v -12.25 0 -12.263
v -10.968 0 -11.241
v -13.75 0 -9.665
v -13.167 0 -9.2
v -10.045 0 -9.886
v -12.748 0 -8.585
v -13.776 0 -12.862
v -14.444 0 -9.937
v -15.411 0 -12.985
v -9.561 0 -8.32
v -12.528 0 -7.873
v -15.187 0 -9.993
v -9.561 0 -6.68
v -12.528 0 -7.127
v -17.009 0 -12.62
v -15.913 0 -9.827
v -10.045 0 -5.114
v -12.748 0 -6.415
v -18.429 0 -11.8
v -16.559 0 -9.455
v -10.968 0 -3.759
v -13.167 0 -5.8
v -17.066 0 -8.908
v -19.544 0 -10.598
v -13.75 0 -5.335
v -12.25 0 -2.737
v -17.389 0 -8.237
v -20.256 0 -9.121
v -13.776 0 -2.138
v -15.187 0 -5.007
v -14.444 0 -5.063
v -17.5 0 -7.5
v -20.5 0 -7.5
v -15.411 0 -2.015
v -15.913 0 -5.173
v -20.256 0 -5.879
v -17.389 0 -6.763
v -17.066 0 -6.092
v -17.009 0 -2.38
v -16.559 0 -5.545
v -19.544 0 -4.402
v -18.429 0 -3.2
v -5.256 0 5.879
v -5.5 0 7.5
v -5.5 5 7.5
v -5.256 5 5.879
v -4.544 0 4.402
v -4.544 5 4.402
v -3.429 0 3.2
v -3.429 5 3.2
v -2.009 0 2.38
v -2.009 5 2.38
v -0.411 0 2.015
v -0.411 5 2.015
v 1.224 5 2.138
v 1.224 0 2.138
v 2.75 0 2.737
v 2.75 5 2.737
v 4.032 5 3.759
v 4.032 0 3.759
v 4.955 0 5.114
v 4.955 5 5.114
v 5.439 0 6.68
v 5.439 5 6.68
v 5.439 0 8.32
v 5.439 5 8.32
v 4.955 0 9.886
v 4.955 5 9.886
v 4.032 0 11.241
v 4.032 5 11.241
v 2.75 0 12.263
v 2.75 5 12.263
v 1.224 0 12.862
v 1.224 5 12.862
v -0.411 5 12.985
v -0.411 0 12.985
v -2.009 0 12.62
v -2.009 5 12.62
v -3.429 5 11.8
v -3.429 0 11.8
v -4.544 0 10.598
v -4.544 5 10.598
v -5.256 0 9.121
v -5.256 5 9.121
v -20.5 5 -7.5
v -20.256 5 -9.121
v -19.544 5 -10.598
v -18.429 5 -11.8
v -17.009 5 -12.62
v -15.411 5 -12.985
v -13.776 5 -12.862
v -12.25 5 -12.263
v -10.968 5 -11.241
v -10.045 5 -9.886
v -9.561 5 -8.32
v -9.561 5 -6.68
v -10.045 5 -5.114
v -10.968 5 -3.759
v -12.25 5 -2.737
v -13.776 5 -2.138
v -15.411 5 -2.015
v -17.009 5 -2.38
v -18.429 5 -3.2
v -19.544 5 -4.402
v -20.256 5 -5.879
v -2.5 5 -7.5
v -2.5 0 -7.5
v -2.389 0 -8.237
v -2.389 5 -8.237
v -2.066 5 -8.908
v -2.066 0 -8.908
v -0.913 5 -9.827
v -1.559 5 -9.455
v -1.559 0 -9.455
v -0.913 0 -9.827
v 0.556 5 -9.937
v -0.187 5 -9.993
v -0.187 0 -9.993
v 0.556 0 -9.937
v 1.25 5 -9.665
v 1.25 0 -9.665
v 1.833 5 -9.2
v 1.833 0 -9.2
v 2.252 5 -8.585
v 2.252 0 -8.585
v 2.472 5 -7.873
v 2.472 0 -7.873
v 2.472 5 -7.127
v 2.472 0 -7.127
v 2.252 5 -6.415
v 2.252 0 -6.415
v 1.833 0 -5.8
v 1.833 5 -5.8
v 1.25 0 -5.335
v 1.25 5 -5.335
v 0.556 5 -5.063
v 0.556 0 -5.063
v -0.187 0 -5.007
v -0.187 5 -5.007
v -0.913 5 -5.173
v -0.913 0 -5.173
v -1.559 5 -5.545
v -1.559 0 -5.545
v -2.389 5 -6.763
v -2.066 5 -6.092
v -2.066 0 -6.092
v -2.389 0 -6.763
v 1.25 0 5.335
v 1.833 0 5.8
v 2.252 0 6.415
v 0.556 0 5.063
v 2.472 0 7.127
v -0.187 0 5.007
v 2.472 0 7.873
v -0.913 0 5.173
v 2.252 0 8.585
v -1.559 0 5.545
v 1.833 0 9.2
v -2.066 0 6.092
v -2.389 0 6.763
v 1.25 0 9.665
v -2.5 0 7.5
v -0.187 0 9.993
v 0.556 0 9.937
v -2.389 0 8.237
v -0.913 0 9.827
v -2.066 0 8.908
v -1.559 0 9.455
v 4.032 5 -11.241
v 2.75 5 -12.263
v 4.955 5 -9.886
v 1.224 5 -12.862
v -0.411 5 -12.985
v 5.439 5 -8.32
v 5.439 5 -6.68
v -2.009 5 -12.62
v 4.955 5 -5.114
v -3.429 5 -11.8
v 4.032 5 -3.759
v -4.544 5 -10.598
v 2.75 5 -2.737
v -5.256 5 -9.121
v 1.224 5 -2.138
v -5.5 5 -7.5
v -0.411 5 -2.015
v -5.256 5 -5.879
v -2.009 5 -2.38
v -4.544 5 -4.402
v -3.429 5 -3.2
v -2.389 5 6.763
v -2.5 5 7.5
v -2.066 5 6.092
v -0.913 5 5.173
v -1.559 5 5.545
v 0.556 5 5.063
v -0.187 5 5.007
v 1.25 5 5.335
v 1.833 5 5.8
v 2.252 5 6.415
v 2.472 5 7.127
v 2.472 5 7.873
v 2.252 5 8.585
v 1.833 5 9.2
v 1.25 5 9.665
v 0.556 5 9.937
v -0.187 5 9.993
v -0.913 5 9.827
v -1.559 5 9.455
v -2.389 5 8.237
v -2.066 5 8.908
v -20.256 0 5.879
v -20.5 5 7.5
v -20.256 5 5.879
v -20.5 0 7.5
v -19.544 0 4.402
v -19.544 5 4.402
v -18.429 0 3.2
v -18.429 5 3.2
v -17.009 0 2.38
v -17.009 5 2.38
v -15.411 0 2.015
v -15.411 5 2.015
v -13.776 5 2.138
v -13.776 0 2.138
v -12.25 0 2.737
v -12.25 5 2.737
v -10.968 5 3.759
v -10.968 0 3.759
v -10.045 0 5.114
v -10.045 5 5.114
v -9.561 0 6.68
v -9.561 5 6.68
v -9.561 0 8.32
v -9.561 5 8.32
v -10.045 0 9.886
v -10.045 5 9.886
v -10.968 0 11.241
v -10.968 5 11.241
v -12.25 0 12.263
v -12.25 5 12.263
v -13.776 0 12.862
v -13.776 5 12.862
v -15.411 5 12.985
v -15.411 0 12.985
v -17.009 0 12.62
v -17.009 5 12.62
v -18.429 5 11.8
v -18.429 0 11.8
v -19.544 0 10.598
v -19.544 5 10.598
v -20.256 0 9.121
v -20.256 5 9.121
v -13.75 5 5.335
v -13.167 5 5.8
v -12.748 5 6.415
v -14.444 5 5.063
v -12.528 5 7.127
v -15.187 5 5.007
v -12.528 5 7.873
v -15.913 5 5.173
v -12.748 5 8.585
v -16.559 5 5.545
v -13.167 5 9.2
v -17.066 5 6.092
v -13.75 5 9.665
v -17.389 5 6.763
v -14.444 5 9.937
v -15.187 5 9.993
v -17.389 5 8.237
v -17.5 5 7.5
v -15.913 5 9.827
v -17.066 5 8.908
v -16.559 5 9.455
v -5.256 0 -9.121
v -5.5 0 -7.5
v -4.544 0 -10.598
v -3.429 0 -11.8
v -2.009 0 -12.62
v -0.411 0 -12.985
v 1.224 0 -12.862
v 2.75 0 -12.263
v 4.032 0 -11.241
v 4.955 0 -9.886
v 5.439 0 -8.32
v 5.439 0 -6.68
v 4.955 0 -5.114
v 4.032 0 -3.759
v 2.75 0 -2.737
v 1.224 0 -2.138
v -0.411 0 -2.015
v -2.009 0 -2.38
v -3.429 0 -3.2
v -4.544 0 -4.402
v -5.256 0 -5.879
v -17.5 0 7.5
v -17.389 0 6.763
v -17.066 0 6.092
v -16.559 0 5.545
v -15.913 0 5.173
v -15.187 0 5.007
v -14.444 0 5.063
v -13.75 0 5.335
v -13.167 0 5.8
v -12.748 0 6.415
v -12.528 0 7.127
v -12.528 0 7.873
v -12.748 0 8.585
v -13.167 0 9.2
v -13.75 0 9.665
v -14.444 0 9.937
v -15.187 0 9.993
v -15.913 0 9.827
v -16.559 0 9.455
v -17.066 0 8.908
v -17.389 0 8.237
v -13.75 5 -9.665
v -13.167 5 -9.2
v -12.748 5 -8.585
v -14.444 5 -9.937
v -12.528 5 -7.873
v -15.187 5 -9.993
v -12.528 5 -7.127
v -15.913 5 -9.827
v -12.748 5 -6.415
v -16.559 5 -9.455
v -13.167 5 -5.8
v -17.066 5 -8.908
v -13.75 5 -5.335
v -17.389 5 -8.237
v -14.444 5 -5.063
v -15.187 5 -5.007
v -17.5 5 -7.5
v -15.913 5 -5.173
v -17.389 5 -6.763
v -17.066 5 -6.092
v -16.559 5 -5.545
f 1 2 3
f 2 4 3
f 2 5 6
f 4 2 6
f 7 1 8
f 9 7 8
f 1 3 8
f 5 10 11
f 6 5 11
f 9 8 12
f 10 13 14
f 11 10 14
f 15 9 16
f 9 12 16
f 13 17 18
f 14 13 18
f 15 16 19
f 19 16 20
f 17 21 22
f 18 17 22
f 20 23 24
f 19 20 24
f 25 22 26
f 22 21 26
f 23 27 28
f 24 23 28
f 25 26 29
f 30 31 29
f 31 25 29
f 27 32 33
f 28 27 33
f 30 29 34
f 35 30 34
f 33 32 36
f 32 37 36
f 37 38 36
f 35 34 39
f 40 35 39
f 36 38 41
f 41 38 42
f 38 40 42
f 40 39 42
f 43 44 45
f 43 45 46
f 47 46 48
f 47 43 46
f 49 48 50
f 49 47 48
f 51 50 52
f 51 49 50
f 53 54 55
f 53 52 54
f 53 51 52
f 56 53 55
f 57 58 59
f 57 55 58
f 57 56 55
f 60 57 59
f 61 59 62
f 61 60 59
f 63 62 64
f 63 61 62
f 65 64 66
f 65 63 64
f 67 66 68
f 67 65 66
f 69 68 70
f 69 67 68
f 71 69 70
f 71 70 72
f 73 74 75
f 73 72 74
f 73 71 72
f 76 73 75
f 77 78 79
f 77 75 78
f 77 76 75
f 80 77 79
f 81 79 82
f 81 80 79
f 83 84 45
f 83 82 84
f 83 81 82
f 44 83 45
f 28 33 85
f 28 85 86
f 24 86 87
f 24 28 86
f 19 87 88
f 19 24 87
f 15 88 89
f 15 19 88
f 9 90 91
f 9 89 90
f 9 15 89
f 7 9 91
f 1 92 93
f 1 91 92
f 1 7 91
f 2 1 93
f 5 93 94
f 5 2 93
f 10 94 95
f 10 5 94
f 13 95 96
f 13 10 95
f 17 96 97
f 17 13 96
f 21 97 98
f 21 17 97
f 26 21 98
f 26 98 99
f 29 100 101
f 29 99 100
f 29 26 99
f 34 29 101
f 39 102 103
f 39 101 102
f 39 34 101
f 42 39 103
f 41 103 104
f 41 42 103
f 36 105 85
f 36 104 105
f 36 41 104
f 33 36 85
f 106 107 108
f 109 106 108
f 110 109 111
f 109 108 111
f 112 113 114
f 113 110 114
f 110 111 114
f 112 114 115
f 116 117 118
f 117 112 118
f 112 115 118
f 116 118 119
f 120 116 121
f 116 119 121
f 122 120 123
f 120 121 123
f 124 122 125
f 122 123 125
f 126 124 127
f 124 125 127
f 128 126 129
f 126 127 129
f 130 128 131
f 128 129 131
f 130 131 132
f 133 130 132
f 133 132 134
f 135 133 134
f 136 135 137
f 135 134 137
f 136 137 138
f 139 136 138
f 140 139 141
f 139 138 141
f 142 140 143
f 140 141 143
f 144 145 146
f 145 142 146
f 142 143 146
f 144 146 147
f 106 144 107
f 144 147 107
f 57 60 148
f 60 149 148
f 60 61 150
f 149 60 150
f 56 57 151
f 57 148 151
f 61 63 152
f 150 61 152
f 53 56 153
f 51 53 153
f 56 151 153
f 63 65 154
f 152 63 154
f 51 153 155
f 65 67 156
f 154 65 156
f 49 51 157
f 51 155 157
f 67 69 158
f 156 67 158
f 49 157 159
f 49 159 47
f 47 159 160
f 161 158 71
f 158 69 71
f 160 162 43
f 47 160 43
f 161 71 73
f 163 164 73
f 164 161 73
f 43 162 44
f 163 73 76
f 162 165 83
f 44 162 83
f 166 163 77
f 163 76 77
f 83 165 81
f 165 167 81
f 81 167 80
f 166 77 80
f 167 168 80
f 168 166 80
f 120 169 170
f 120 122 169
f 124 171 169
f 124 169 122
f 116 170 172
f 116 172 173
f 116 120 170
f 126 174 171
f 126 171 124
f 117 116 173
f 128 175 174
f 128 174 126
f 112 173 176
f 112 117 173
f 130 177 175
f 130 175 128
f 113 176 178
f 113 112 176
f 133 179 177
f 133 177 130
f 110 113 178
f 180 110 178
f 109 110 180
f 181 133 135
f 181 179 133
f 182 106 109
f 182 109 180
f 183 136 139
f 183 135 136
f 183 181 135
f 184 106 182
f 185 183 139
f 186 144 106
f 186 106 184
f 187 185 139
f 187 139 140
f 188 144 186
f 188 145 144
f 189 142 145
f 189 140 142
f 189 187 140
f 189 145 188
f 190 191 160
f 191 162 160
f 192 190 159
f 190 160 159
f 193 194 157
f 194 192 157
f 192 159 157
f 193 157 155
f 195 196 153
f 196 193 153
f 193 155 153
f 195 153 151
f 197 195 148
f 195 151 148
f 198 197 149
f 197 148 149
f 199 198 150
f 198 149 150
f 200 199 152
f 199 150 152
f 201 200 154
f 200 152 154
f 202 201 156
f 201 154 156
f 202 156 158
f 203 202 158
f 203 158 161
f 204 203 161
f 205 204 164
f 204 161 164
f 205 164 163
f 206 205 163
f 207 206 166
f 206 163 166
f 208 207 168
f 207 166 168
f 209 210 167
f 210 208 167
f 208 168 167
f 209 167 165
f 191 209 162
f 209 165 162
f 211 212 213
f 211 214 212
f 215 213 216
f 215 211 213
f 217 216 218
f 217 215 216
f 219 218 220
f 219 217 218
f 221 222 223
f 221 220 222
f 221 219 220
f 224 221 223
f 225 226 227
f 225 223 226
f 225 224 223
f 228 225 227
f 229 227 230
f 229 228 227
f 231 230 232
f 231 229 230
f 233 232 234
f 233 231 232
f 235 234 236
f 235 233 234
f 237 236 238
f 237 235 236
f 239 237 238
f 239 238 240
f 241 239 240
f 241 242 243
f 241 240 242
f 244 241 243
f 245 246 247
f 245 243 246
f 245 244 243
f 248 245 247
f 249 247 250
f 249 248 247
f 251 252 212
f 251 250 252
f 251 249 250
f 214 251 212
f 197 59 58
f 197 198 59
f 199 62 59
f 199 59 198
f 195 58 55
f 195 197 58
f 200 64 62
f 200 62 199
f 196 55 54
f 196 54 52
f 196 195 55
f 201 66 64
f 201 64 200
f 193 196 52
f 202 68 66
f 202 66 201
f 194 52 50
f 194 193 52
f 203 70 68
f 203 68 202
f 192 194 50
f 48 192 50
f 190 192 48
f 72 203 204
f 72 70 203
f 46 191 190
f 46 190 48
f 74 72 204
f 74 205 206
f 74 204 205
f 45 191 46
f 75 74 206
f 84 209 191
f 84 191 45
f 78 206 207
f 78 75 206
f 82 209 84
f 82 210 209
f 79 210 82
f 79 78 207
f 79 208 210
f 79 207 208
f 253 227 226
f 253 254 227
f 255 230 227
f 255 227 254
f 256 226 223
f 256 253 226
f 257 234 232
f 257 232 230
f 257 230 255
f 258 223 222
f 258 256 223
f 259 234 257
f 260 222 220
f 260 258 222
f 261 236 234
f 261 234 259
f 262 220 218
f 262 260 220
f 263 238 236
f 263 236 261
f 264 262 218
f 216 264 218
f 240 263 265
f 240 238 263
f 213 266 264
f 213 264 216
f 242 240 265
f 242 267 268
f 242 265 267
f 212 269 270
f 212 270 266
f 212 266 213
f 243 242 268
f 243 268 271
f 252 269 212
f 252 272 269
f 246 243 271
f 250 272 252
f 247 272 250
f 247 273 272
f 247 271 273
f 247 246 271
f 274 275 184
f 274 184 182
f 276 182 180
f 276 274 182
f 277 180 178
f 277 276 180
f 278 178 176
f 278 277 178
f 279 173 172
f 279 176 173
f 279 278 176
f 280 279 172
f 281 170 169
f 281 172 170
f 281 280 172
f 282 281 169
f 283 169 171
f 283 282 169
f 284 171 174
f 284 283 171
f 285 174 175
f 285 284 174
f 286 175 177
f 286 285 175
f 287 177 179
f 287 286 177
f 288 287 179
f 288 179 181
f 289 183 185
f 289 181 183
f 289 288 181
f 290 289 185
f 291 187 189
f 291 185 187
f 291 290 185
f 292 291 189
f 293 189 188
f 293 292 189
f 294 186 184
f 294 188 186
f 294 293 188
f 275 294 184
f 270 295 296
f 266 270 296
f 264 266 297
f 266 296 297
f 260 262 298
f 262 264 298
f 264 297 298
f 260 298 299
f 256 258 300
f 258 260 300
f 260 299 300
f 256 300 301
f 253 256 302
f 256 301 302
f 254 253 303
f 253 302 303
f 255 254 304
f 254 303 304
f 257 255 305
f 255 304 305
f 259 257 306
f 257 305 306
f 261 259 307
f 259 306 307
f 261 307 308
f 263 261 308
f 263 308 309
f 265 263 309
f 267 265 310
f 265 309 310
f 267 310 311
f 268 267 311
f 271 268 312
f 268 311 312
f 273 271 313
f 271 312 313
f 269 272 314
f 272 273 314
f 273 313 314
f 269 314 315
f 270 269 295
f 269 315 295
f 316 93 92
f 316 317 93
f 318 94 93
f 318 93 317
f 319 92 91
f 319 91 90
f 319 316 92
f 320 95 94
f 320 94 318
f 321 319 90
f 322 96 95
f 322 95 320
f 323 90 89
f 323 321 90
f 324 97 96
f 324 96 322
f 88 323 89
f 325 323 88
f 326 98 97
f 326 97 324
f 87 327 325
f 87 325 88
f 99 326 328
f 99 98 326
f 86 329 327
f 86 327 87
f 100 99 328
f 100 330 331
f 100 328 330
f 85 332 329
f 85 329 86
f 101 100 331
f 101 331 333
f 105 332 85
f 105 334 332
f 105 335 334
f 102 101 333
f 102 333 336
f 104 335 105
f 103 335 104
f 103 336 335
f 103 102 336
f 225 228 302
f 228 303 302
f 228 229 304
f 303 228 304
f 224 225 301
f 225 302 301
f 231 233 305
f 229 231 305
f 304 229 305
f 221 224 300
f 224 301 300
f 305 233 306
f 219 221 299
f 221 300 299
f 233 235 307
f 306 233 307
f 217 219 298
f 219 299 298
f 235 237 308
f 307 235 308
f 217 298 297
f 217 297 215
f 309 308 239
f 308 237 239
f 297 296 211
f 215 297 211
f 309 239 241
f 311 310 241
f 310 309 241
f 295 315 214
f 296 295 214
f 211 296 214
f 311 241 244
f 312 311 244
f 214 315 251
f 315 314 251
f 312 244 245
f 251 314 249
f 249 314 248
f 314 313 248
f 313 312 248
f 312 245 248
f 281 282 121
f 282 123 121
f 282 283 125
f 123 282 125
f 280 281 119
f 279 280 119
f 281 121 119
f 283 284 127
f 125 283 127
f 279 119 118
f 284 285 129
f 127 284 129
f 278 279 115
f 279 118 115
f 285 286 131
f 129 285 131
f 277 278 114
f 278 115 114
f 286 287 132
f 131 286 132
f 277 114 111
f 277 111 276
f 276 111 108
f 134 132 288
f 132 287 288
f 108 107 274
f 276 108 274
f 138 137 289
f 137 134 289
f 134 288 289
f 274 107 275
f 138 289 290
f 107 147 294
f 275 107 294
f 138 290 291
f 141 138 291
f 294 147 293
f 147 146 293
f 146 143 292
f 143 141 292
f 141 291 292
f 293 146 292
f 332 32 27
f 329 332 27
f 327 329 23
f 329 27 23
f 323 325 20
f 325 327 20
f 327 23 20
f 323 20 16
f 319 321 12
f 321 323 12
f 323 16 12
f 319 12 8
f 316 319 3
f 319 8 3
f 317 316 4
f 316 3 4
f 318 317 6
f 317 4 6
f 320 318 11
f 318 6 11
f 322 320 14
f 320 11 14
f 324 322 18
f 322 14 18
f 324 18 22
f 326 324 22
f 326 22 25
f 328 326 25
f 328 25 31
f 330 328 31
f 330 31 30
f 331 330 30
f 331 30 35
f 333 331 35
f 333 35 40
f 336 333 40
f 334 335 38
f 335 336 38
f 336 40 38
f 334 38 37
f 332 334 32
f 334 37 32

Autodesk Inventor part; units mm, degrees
ref_plane "YZ Plane" through (0, 0, 0) normal (1, 0, 0) x (0, 1, 0)
ref_plane "XZ Plane" through (0, 0, 0) normal (0, 1, 0) x (-1, 0, 0)
ref_plane "XY Plane" through (0, 0, 0) normal (0, 0, 1) x (1, 0, 0)
sketch "Sketch1" plane through (0, 0, 0) normal (0, 1, 0) x (-1, 0, 0)
  circle A0 centre (0, 7.5) radius 5.5
  circle A1 centre (0, 7.5) radius 2.5
  line L0 (0, 7.5) -> (7.5, 7.5)
  line L1 (7.5, 7.5) -> (7.5, 0)
  circle A2 centre (15, 7.5) radius 5.5
  circle A3 centre (15, 7.5) radius 2.5
  line L2 (0, 0) -> (7.5, 0)
  circle A4 centre (0, -7.5) radius 5.5
  circle A5 centre (0, -7.5) radius 2.5
  circle A6 centre (15, -7.5) radius 5.5
  circle A7 centre (15, -7.5) radius 2.5
  dimension "d0" = 11
  dimension "d1" = 7.5
  dimension "d2" = 5
  dimension "d3" = 7.5
extrude "Extrusion1" add sketch "Sketch1" along normal blind 5
properties part number "Gripper_Gen3_BearingArray"
